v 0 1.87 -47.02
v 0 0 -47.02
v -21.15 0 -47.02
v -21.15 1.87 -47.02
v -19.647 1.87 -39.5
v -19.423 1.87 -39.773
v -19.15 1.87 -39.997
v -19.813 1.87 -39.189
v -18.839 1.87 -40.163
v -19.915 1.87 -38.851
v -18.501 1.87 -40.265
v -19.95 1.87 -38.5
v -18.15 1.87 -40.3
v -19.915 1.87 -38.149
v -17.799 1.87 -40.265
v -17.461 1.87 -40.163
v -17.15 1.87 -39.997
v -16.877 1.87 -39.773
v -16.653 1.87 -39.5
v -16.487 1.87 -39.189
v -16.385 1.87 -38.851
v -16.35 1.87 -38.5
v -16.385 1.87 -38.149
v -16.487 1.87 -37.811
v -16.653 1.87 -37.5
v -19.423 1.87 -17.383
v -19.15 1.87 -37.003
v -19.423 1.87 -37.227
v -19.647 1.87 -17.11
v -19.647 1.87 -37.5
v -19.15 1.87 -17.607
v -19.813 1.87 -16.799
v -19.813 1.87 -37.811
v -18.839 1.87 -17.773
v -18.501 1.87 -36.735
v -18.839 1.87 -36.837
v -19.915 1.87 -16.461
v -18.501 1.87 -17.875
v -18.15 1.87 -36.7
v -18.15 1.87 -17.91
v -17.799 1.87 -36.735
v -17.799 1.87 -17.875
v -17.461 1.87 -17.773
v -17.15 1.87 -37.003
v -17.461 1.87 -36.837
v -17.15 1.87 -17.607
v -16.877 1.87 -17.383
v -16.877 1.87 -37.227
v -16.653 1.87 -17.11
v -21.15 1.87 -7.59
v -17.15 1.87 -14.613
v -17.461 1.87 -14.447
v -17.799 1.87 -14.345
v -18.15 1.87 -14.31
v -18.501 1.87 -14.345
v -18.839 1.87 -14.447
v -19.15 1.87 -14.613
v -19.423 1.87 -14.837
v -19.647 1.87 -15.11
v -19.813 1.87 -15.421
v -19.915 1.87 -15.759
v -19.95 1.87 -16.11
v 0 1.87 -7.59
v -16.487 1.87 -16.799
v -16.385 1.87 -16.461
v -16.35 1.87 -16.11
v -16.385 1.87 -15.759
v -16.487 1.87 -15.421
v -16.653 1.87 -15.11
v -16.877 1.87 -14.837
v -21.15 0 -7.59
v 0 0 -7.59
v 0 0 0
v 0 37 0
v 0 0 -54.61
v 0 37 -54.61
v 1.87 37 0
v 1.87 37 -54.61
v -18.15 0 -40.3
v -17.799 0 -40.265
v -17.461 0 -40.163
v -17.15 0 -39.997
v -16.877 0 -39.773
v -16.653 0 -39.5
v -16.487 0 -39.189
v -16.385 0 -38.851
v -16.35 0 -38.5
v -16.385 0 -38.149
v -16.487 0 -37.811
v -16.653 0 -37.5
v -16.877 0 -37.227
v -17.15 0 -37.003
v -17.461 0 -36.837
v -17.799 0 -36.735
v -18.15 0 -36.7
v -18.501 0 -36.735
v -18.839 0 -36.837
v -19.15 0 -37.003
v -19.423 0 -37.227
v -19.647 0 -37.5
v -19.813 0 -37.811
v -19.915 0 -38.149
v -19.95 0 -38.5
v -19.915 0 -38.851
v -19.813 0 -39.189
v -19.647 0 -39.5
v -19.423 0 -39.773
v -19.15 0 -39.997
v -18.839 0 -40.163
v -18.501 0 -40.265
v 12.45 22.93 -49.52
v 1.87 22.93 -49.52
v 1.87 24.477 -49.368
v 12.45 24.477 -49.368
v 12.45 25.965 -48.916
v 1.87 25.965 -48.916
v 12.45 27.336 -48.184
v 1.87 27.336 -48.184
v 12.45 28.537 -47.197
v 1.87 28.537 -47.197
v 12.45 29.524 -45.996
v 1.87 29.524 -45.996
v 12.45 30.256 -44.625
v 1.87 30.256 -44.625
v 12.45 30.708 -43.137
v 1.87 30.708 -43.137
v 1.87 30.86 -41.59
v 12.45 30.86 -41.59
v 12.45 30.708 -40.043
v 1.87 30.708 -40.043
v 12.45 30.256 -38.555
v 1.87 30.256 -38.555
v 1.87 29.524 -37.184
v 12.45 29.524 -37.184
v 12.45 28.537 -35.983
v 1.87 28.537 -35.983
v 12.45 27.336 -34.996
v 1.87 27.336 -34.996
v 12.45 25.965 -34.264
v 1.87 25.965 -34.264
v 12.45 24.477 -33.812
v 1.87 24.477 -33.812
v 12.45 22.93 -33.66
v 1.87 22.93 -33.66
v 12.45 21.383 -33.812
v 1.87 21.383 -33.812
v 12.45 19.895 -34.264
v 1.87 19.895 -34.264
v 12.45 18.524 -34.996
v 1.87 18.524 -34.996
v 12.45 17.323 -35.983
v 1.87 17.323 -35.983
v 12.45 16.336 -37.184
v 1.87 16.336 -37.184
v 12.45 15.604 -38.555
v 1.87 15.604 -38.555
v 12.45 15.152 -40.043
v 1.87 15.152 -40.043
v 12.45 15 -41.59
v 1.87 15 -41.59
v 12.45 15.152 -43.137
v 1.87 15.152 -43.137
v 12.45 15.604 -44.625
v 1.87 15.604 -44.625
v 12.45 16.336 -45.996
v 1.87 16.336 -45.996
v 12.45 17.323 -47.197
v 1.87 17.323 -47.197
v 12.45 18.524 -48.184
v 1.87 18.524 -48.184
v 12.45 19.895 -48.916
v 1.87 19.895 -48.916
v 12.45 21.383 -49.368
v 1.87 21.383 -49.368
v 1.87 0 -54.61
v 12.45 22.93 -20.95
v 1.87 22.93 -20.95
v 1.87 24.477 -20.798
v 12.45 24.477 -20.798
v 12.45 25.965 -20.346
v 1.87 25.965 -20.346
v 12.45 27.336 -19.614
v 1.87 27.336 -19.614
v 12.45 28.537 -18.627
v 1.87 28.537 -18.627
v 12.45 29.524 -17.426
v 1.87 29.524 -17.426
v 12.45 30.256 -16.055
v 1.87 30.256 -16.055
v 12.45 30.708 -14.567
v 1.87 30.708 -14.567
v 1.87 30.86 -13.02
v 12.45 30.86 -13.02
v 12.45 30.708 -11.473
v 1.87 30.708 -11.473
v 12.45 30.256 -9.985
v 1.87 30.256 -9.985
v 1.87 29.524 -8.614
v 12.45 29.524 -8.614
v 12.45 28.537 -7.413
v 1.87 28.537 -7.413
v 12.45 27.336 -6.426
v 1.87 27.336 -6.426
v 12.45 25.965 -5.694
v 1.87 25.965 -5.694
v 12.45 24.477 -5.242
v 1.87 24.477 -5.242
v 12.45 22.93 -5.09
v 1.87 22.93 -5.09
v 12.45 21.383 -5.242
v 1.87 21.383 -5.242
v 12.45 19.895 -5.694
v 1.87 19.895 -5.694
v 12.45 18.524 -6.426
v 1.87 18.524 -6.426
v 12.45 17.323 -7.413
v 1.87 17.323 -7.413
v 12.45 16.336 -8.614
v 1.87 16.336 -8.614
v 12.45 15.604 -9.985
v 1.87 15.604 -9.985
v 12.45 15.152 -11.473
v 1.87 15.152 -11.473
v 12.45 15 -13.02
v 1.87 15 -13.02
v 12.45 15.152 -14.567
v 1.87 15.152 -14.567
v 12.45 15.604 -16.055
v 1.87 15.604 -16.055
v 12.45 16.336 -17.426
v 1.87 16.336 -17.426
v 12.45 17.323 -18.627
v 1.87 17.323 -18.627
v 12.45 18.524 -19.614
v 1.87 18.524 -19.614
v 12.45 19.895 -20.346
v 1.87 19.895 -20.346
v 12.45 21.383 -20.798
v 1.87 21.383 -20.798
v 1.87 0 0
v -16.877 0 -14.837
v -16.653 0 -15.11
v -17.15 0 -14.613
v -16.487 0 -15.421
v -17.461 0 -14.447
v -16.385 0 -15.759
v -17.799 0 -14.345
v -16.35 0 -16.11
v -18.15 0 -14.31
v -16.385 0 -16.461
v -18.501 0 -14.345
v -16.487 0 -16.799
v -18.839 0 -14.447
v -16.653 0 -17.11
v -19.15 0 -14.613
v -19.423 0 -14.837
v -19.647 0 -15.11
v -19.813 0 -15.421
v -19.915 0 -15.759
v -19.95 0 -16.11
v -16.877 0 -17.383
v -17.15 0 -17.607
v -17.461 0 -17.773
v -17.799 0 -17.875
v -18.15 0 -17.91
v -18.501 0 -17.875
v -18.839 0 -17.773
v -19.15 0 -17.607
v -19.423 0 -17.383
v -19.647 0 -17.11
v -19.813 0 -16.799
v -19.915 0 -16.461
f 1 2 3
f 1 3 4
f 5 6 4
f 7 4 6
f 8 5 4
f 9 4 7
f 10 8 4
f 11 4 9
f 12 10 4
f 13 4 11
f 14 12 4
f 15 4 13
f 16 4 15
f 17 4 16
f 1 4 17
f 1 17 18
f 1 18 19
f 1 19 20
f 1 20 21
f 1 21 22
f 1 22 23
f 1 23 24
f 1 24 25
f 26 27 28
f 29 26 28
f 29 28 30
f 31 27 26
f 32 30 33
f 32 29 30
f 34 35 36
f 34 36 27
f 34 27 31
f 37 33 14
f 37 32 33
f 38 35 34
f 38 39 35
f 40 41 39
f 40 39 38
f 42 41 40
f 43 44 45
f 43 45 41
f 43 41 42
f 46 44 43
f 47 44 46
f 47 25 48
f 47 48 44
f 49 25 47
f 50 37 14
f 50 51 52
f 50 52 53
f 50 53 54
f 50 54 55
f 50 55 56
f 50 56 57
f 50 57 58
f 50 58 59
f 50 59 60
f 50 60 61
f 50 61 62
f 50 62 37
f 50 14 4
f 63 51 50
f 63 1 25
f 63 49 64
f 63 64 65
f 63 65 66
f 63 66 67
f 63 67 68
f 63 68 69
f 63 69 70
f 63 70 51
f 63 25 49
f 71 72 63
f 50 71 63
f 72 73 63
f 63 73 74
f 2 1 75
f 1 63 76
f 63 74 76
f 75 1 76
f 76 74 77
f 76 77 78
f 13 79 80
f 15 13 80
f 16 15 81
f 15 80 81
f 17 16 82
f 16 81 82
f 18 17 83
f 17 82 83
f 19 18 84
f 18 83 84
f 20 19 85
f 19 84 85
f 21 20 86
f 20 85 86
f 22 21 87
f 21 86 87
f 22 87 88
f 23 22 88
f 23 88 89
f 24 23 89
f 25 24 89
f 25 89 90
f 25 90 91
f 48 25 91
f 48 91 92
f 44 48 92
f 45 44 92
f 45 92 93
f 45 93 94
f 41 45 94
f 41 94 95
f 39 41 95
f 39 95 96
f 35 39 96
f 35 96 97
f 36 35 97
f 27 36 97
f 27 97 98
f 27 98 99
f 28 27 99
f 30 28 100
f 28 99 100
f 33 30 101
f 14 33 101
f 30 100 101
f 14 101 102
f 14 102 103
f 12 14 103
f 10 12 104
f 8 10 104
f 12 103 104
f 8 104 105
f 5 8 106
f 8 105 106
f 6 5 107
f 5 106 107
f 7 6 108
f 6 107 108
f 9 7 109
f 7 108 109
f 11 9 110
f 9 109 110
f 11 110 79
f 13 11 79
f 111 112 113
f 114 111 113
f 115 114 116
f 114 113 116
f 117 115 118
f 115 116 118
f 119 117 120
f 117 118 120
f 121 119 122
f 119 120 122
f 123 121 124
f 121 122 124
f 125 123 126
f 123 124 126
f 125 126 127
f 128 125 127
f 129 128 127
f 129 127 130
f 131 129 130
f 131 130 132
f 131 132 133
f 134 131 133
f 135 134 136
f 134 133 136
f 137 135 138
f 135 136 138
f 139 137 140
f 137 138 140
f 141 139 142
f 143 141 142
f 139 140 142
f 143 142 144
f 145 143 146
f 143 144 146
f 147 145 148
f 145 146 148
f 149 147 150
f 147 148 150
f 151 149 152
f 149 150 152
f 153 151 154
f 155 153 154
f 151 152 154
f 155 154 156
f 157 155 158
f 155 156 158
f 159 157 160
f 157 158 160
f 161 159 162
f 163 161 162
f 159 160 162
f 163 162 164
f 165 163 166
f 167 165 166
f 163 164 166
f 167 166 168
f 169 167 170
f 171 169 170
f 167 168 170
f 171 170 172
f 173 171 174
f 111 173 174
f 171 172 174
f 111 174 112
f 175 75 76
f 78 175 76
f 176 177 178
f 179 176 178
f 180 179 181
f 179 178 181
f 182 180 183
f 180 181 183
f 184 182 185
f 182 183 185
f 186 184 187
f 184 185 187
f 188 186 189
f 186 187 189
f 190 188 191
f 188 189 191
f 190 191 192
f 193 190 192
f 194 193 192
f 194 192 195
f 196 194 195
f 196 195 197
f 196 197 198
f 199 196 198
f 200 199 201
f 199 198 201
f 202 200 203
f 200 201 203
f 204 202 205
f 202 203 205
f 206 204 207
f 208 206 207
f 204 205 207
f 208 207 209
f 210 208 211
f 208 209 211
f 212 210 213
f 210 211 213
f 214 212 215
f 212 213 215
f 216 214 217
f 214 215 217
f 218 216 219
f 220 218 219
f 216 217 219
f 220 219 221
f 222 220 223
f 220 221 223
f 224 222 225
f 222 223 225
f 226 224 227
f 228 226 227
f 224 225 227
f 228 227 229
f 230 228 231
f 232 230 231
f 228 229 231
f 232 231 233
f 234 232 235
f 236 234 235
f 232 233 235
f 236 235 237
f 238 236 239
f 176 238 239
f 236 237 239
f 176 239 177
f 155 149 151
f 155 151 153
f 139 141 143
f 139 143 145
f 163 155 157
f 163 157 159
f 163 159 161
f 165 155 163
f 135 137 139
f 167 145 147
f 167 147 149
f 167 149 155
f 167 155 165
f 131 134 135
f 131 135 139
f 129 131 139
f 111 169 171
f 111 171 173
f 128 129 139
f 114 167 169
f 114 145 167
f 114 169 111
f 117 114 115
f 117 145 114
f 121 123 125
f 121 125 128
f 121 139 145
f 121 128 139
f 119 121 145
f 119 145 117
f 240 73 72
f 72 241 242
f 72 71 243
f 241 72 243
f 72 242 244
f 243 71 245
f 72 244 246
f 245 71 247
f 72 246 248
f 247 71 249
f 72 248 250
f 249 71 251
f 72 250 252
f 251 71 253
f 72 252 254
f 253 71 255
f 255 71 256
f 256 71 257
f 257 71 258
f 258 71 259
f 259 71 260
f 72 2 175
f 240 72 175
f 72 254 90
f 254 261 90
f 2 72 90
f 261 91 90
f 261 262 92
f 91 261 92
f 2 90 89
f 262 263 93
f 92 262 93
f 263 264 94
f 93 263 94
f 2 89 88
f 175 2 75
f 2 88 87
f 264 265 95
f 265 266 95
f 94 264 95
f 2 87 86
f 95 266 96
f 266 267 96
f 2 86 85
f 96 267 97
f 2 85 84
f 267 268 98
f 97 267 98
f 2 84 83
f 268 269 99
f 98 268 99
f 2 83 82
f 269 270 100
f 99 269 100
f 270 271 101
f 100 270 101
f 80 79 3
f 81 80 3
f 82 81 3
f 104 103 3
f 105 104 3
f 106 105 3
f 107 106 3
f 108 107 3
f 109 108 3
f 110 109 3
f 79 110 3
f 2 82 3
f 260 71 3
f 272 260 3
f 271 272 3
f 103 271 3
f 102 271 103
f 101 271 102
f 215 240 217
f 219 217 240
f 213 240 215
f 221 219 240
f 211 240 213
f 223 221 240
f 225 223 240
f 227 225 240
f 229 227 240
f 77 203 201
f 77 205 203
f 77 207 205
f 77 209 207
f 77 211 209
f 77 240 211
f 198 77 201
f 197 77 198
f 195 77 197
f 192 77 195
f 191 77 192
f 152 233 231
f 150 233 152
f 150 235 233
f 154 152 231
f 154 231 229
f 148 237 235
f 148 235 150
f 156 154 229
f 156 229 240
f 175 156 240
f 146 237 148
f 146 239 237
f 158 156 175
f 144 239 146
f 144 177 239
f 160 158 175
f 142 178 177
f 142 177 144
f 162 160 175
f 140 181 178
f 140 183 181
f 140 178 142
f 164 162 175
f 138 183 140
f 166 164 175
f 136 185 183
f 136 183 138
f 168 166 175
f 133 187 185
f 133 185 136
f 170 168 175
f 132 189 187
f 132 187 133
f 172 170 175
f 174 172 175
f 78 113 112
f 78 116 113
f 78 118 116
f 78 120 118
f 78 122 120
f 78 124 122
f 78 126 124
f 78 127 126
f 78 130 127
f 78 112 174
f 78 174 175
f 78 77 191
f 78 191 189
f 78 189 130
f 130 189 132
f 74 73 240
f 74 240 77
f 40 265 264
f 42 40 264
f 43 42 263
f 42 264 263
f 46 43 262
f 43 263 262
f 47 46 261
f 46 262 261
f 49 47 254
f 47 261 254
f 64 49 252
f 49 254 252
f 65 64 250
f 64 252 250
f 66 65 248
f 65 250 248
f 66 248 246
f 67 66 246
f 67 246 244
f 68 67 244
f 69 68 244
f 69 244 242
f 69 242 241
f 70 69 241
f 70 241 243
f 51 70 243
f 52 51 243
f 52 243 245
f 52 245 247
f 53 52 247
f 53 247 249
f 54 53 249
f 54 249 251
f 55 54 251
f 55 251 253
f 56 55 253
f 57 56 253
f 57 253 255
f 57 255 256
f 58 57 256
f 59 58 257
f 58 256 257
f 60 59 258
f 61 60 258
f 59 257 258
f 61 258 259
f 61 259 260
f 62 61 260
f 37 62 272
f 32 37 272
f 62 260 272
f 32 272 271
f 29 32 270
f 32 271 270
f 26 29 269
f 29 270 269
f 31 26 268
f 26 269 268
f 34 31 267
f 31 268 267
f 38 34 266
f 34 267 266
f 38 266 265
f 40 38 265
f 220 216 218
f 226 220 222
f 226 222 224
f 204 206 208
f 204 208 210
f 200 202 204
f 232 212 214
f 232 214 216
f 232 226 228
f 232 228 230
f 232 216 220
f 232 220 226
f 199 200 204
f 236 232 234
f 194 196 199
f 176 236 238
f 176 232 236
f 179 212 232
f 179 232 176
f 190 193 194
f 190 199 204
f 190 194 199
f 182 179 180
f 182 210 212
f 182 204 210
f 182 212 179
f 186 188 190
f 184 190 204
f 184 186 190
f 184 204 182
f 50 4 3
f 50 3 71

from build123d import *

# Parameters (mm, degrees)
ESQUISSE1_W          = 54.61
ESQUISSE1_H          = 37
BOSS_EXTRU_1_DEPTH   = 1.87
ESQUISSE2_R          = 7.93
BOSS_EXTRU_2_DEPTH   = 10.58
ESQUISSE3_W          = 39.43
ESQUISSE3_H          = 1.87
BOSS_EXTRU_3_DEPTH   = 21.15
D_GAGEMENT_M31_D     = 3.6
D_GAGEMENT_M31_DEPTH = 1.99
D_GAGEMENT_M31_TIP   = 1.081549114


with BuildPart() as part:
    # Esquisse1 → Boss.-Extru.1 (new body)
    with BuildSketch(Plane(origin=(0, 0, 0), x_dir=(0, 0, -1), z_dir=(1, 0, 0))):
        with Locations((27.305, 18.5)):
            Rectangle(ESQUISSE1_W, ESQUISSE1_H)
    extrude(amount=BOSS_EXTRU_1_DEPTH)

    # Esquisse2 → Boss.-Extru.2 (add)
    with BuildSketch(Plane(origin=(1.87, 0, 0), x_dir=(0, 0, -1), z_dir=(1, 0, 0))):
        with Locations((13.02, 22.93)):
            Circle(ESQUISSE2_R)
        with Locations((41.59, 22.93)):
            Circle(ESQUISSE2_R)
    extrude(amount=BOSS_EXTRU_2_DEPTH)

    # Esquisse3 → Boss.-Extru.3 (add)
    with BuildSketch(Plane.ZY):
        with Locations((-27.305, 0.935)):
            Rectangle(ESQUISSE3_W, ESQUISSE3_H)
    extrude(amount=BOSS_EXTRU_3_DEPTH)

    # Dégagement M31
    with Locations(Plane(origin=(-18.15, 1.87, -38.5), x_dir=(0, 0, 1), z_dir=(0, 1, 0))):
        with Locations((0, 0), (22.39, 0)):
            Hole(D_GAGEMENT_M31_D / 2, depth=D_GAGEMENT_M31_DEPTH)
            with Locations((0, 0, -(D_GAGEMENT_M31_DEPTH + D_GAGEMENT_M31_TIP / 2))):  # 118° drill point
                Cone(0, D_GAGEMENT_M31_D / 2, D_GAGEMENT_M31_TIP, mode=Mode.SUBTRACT)


solid = part.part
